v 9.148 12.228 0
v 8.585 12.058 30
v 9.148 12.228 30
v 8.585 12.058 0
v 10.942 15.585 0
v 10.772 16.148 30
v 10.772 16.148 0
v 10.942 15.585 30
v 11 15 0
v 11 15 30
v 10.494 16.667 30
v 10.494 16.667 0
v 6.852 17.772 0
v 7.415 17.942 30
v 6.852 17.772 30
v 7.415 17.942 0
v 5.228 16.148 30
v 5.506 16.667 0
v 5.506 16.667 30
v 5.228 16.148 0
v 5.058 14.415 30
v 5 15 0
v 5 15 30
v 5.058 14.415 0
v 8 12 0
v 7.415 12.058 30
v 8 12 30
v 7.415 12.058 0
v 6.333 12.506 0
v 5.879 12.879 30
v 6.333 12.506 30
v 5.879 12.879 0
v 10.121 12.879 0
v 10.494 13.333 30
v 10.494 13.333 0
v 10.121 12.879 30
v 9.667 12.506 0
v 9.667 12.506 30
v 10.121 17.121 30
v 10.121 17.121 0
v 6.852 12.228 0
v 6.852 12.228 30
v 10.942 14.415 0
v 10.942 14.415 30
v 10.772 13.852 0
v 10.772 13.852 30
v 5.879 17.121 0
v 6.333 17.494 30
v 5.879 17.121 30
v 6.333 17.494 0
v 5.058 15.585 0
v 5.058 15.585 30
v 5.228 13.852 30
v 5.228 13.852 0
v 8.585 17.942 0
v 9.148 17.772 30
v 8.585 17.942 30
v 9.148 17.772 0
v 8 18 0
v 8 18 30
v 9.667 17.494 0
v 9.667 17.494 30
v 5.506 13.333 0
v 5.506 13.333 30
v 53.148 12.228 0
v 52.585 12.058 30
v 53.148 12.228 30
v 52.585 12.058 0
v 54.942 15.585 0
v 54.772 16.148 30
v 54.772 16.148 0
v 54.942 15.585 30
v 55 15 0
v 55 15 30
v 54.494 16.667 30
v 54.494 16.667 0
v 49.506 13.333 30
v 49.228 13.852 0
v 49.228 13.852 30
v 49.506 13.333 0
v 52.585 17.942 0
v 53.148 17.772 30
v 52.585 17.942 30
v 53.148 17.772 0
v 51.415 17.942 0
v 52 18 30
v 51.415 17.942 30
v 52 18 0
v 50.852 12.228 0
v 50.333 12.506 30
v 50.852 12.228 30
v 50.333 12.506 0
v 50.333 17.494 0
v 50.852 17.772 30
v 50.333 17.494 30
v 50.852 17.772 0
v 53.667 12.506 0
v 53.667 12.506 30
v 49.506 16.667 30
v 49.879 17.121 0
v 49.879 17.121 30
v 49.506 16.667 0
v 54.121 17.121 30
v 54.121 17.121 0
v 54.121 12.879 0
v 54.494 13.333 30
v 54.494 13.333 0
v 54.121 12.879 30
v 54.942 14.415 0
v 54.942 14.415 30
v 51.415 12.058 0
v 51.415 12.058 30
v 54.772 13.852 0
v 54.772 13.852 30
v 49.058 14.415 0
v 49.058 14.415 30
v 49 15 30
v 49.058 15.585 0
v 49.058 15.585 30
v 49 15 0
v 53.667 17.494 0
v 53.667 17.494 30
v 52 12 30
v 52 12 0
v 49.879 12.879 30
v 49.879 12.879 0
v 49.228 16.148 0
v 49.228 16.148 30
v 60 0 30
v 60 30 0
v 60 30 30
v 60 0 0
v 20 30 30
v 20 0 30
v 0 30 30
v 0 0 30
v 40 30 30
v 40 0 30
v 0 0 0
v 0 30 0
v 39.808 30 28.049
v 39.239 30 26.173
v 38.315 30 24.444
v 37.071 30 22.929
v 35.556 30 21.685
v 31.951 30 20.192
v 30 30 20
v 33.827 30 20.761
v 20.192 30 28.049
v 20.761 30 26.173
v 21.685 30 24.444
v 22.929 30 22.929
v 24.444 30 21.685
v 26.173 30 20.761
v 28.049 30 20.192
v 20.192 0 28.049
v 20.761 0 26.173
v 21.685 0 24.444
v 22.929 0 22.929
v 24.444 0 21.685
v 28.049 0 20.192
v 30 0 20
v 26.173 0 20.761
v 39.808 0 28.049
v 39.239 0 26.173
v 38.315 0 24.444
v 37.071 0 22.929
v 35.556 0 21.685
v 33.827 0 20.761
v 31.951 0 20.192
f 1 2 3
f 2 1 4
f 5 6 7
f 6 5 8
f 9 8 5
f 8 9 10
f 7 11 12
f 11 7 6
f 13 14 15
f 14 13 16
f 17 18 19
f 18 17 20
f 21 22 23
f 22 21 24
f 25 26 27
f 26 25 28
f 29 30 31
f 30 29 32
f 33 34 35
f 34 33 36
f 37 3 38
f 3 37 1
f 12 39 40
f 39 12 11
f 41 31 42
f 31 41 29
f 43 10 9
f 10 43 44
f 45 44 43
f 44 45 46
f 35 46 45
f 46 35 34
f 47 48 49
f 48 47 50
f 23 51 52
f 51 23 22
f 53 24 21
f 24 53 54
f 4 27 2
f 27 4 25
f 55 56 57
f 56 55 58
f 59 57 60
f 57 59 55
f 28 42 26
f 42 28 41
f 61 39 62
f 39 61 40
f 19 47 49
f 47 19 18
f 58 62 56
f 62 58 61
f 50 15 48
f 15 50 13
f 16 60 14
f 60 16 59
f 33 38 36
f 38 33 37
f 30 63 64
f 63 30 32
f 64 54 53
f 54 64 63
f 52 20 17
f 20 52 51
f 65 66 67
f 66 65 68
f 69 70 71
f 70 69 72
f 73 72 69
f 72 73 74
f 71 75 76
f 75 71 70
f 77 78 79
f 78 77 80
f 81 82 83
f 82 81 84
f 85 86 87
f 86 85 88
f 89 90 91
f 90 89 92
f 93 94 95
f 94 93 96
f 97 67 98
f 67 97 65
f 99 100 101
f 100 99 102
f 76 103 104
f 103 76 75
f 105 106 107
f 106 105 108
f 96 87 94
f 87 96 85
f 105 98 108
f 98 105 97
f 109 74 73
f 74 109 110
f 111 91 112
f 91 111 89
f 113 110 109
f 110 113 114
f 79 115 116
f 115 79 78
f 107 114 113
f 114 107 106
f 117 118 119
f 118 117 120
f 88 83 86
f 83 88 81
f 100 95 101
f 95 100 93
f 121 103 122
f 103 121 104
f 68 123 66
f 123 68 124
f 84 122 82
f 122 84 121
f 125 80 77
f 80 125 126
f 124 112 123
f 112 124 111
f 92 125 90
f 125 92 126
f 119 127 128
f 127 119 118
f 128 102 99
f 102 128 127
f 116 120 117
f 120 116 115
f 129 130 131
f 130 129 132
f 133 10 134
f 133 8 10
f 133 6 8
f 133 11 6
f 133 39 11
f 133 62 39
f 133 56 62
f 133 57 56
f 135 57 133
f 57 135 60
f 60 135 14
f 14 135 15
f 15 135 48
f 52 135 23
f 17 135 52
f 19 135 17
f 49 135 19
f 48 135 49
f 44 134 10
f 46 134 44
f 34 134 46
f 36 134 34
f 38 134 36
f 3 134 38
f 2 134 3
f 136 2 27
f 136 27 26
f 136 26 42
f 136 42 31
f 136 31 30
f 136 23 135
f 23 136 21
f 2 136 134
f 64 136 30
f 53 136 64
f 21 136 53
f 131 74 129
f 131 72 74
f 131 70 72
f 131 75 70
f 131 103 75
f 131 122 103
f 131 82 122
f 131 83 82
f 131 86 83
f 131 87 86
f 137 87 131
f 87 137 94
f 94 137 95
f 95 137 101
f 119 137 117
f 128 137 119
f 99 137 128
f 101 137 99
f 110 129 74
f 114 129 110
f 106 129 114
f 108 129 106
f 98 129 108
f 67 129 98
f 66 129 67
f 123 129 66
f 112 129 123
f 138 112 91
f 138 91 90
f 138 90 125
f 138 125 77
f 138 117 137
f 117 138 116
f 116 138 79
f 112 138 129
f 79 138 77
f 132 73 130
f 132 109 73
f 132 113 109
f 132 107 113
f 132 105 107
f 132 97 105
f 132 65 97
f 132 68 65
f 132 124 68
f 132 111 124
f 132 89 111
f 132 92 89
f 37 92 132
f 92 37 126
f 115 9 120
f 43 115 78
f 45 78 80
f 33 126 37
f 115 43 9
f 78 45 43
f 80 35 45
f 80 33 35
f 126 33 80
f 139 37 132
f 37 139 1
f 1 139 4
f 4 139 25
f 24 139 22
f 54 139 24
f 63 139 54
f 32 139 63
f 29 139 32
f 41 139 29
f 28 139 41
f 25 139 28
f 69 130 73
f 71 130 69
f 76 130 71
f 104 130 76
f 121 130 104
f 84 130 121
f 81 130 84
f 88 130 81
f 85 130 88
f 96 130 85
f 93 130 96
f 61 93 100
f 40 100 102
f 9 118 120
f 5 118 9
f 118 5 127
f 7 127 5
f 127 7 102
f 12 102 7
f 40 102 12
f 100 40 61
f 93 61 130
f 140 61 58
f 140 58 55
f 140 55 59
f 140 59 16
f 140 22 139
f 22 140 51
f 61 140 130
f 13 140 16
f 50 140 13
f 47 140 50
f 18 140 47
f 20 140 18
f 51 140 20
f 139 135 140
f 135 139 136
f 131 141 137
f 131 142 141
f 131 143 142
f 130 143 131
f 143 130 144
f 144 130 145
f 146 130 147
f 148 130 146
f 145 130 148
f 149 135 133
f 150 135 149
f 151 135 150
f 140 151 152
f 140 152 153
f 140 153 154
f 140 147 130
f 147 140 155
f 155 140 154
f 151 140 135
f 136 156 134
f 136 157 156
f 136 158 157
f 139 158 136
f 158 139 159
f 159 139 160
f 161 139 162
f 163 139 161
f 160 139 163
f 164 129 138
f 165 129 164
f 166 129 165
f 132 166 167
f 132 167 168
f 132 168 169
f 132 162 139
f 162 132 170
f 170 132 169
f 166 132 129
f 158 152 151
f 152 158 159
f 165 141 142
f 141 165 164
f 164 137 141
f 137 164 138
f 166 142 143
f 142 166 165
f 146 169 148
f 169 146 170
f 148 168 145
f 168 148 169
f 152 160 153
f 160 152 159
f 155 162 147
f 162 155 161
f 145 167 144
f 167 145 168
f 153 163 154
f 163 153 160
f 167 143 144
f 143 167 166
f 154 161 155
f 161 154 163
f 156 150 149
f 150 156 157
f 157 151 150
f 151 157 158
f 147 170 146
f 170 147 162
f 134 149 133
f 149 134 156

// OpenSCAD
$fn = 32;

// ----------------------------------------------------------------------
// Saddle clamp: plain shaft clamp
// ----------------------------------------------------------------------

// --- parameters (mm) ---
blk_l = 60;               // block length, X
blk_w = 30;               // block width, Y
blk_h = 30;               // block height
clamp_r = 10;             // shaft groove radius
hole_r = 3;               // bolt hole radius
hole_m = 8;               // bolt hole margin from the ends

saw_depth = clamp_r + 3;  // saw kerf depth

difference() {
  cube([blk_l, blk_w, blk_h]);
  translate([blk_l / 2, -1, blk_h])
    rotate([-90, 0, 0])
      cylinder(h = blk_w + 2, r = clamp_r);
  for (sx = [0, 1])
    translate([sx ? blk_l - hole_m : hole_m, blk_w / 2, -1])
      cylinder(r = hole_r, h = blk_h + 2);
}
